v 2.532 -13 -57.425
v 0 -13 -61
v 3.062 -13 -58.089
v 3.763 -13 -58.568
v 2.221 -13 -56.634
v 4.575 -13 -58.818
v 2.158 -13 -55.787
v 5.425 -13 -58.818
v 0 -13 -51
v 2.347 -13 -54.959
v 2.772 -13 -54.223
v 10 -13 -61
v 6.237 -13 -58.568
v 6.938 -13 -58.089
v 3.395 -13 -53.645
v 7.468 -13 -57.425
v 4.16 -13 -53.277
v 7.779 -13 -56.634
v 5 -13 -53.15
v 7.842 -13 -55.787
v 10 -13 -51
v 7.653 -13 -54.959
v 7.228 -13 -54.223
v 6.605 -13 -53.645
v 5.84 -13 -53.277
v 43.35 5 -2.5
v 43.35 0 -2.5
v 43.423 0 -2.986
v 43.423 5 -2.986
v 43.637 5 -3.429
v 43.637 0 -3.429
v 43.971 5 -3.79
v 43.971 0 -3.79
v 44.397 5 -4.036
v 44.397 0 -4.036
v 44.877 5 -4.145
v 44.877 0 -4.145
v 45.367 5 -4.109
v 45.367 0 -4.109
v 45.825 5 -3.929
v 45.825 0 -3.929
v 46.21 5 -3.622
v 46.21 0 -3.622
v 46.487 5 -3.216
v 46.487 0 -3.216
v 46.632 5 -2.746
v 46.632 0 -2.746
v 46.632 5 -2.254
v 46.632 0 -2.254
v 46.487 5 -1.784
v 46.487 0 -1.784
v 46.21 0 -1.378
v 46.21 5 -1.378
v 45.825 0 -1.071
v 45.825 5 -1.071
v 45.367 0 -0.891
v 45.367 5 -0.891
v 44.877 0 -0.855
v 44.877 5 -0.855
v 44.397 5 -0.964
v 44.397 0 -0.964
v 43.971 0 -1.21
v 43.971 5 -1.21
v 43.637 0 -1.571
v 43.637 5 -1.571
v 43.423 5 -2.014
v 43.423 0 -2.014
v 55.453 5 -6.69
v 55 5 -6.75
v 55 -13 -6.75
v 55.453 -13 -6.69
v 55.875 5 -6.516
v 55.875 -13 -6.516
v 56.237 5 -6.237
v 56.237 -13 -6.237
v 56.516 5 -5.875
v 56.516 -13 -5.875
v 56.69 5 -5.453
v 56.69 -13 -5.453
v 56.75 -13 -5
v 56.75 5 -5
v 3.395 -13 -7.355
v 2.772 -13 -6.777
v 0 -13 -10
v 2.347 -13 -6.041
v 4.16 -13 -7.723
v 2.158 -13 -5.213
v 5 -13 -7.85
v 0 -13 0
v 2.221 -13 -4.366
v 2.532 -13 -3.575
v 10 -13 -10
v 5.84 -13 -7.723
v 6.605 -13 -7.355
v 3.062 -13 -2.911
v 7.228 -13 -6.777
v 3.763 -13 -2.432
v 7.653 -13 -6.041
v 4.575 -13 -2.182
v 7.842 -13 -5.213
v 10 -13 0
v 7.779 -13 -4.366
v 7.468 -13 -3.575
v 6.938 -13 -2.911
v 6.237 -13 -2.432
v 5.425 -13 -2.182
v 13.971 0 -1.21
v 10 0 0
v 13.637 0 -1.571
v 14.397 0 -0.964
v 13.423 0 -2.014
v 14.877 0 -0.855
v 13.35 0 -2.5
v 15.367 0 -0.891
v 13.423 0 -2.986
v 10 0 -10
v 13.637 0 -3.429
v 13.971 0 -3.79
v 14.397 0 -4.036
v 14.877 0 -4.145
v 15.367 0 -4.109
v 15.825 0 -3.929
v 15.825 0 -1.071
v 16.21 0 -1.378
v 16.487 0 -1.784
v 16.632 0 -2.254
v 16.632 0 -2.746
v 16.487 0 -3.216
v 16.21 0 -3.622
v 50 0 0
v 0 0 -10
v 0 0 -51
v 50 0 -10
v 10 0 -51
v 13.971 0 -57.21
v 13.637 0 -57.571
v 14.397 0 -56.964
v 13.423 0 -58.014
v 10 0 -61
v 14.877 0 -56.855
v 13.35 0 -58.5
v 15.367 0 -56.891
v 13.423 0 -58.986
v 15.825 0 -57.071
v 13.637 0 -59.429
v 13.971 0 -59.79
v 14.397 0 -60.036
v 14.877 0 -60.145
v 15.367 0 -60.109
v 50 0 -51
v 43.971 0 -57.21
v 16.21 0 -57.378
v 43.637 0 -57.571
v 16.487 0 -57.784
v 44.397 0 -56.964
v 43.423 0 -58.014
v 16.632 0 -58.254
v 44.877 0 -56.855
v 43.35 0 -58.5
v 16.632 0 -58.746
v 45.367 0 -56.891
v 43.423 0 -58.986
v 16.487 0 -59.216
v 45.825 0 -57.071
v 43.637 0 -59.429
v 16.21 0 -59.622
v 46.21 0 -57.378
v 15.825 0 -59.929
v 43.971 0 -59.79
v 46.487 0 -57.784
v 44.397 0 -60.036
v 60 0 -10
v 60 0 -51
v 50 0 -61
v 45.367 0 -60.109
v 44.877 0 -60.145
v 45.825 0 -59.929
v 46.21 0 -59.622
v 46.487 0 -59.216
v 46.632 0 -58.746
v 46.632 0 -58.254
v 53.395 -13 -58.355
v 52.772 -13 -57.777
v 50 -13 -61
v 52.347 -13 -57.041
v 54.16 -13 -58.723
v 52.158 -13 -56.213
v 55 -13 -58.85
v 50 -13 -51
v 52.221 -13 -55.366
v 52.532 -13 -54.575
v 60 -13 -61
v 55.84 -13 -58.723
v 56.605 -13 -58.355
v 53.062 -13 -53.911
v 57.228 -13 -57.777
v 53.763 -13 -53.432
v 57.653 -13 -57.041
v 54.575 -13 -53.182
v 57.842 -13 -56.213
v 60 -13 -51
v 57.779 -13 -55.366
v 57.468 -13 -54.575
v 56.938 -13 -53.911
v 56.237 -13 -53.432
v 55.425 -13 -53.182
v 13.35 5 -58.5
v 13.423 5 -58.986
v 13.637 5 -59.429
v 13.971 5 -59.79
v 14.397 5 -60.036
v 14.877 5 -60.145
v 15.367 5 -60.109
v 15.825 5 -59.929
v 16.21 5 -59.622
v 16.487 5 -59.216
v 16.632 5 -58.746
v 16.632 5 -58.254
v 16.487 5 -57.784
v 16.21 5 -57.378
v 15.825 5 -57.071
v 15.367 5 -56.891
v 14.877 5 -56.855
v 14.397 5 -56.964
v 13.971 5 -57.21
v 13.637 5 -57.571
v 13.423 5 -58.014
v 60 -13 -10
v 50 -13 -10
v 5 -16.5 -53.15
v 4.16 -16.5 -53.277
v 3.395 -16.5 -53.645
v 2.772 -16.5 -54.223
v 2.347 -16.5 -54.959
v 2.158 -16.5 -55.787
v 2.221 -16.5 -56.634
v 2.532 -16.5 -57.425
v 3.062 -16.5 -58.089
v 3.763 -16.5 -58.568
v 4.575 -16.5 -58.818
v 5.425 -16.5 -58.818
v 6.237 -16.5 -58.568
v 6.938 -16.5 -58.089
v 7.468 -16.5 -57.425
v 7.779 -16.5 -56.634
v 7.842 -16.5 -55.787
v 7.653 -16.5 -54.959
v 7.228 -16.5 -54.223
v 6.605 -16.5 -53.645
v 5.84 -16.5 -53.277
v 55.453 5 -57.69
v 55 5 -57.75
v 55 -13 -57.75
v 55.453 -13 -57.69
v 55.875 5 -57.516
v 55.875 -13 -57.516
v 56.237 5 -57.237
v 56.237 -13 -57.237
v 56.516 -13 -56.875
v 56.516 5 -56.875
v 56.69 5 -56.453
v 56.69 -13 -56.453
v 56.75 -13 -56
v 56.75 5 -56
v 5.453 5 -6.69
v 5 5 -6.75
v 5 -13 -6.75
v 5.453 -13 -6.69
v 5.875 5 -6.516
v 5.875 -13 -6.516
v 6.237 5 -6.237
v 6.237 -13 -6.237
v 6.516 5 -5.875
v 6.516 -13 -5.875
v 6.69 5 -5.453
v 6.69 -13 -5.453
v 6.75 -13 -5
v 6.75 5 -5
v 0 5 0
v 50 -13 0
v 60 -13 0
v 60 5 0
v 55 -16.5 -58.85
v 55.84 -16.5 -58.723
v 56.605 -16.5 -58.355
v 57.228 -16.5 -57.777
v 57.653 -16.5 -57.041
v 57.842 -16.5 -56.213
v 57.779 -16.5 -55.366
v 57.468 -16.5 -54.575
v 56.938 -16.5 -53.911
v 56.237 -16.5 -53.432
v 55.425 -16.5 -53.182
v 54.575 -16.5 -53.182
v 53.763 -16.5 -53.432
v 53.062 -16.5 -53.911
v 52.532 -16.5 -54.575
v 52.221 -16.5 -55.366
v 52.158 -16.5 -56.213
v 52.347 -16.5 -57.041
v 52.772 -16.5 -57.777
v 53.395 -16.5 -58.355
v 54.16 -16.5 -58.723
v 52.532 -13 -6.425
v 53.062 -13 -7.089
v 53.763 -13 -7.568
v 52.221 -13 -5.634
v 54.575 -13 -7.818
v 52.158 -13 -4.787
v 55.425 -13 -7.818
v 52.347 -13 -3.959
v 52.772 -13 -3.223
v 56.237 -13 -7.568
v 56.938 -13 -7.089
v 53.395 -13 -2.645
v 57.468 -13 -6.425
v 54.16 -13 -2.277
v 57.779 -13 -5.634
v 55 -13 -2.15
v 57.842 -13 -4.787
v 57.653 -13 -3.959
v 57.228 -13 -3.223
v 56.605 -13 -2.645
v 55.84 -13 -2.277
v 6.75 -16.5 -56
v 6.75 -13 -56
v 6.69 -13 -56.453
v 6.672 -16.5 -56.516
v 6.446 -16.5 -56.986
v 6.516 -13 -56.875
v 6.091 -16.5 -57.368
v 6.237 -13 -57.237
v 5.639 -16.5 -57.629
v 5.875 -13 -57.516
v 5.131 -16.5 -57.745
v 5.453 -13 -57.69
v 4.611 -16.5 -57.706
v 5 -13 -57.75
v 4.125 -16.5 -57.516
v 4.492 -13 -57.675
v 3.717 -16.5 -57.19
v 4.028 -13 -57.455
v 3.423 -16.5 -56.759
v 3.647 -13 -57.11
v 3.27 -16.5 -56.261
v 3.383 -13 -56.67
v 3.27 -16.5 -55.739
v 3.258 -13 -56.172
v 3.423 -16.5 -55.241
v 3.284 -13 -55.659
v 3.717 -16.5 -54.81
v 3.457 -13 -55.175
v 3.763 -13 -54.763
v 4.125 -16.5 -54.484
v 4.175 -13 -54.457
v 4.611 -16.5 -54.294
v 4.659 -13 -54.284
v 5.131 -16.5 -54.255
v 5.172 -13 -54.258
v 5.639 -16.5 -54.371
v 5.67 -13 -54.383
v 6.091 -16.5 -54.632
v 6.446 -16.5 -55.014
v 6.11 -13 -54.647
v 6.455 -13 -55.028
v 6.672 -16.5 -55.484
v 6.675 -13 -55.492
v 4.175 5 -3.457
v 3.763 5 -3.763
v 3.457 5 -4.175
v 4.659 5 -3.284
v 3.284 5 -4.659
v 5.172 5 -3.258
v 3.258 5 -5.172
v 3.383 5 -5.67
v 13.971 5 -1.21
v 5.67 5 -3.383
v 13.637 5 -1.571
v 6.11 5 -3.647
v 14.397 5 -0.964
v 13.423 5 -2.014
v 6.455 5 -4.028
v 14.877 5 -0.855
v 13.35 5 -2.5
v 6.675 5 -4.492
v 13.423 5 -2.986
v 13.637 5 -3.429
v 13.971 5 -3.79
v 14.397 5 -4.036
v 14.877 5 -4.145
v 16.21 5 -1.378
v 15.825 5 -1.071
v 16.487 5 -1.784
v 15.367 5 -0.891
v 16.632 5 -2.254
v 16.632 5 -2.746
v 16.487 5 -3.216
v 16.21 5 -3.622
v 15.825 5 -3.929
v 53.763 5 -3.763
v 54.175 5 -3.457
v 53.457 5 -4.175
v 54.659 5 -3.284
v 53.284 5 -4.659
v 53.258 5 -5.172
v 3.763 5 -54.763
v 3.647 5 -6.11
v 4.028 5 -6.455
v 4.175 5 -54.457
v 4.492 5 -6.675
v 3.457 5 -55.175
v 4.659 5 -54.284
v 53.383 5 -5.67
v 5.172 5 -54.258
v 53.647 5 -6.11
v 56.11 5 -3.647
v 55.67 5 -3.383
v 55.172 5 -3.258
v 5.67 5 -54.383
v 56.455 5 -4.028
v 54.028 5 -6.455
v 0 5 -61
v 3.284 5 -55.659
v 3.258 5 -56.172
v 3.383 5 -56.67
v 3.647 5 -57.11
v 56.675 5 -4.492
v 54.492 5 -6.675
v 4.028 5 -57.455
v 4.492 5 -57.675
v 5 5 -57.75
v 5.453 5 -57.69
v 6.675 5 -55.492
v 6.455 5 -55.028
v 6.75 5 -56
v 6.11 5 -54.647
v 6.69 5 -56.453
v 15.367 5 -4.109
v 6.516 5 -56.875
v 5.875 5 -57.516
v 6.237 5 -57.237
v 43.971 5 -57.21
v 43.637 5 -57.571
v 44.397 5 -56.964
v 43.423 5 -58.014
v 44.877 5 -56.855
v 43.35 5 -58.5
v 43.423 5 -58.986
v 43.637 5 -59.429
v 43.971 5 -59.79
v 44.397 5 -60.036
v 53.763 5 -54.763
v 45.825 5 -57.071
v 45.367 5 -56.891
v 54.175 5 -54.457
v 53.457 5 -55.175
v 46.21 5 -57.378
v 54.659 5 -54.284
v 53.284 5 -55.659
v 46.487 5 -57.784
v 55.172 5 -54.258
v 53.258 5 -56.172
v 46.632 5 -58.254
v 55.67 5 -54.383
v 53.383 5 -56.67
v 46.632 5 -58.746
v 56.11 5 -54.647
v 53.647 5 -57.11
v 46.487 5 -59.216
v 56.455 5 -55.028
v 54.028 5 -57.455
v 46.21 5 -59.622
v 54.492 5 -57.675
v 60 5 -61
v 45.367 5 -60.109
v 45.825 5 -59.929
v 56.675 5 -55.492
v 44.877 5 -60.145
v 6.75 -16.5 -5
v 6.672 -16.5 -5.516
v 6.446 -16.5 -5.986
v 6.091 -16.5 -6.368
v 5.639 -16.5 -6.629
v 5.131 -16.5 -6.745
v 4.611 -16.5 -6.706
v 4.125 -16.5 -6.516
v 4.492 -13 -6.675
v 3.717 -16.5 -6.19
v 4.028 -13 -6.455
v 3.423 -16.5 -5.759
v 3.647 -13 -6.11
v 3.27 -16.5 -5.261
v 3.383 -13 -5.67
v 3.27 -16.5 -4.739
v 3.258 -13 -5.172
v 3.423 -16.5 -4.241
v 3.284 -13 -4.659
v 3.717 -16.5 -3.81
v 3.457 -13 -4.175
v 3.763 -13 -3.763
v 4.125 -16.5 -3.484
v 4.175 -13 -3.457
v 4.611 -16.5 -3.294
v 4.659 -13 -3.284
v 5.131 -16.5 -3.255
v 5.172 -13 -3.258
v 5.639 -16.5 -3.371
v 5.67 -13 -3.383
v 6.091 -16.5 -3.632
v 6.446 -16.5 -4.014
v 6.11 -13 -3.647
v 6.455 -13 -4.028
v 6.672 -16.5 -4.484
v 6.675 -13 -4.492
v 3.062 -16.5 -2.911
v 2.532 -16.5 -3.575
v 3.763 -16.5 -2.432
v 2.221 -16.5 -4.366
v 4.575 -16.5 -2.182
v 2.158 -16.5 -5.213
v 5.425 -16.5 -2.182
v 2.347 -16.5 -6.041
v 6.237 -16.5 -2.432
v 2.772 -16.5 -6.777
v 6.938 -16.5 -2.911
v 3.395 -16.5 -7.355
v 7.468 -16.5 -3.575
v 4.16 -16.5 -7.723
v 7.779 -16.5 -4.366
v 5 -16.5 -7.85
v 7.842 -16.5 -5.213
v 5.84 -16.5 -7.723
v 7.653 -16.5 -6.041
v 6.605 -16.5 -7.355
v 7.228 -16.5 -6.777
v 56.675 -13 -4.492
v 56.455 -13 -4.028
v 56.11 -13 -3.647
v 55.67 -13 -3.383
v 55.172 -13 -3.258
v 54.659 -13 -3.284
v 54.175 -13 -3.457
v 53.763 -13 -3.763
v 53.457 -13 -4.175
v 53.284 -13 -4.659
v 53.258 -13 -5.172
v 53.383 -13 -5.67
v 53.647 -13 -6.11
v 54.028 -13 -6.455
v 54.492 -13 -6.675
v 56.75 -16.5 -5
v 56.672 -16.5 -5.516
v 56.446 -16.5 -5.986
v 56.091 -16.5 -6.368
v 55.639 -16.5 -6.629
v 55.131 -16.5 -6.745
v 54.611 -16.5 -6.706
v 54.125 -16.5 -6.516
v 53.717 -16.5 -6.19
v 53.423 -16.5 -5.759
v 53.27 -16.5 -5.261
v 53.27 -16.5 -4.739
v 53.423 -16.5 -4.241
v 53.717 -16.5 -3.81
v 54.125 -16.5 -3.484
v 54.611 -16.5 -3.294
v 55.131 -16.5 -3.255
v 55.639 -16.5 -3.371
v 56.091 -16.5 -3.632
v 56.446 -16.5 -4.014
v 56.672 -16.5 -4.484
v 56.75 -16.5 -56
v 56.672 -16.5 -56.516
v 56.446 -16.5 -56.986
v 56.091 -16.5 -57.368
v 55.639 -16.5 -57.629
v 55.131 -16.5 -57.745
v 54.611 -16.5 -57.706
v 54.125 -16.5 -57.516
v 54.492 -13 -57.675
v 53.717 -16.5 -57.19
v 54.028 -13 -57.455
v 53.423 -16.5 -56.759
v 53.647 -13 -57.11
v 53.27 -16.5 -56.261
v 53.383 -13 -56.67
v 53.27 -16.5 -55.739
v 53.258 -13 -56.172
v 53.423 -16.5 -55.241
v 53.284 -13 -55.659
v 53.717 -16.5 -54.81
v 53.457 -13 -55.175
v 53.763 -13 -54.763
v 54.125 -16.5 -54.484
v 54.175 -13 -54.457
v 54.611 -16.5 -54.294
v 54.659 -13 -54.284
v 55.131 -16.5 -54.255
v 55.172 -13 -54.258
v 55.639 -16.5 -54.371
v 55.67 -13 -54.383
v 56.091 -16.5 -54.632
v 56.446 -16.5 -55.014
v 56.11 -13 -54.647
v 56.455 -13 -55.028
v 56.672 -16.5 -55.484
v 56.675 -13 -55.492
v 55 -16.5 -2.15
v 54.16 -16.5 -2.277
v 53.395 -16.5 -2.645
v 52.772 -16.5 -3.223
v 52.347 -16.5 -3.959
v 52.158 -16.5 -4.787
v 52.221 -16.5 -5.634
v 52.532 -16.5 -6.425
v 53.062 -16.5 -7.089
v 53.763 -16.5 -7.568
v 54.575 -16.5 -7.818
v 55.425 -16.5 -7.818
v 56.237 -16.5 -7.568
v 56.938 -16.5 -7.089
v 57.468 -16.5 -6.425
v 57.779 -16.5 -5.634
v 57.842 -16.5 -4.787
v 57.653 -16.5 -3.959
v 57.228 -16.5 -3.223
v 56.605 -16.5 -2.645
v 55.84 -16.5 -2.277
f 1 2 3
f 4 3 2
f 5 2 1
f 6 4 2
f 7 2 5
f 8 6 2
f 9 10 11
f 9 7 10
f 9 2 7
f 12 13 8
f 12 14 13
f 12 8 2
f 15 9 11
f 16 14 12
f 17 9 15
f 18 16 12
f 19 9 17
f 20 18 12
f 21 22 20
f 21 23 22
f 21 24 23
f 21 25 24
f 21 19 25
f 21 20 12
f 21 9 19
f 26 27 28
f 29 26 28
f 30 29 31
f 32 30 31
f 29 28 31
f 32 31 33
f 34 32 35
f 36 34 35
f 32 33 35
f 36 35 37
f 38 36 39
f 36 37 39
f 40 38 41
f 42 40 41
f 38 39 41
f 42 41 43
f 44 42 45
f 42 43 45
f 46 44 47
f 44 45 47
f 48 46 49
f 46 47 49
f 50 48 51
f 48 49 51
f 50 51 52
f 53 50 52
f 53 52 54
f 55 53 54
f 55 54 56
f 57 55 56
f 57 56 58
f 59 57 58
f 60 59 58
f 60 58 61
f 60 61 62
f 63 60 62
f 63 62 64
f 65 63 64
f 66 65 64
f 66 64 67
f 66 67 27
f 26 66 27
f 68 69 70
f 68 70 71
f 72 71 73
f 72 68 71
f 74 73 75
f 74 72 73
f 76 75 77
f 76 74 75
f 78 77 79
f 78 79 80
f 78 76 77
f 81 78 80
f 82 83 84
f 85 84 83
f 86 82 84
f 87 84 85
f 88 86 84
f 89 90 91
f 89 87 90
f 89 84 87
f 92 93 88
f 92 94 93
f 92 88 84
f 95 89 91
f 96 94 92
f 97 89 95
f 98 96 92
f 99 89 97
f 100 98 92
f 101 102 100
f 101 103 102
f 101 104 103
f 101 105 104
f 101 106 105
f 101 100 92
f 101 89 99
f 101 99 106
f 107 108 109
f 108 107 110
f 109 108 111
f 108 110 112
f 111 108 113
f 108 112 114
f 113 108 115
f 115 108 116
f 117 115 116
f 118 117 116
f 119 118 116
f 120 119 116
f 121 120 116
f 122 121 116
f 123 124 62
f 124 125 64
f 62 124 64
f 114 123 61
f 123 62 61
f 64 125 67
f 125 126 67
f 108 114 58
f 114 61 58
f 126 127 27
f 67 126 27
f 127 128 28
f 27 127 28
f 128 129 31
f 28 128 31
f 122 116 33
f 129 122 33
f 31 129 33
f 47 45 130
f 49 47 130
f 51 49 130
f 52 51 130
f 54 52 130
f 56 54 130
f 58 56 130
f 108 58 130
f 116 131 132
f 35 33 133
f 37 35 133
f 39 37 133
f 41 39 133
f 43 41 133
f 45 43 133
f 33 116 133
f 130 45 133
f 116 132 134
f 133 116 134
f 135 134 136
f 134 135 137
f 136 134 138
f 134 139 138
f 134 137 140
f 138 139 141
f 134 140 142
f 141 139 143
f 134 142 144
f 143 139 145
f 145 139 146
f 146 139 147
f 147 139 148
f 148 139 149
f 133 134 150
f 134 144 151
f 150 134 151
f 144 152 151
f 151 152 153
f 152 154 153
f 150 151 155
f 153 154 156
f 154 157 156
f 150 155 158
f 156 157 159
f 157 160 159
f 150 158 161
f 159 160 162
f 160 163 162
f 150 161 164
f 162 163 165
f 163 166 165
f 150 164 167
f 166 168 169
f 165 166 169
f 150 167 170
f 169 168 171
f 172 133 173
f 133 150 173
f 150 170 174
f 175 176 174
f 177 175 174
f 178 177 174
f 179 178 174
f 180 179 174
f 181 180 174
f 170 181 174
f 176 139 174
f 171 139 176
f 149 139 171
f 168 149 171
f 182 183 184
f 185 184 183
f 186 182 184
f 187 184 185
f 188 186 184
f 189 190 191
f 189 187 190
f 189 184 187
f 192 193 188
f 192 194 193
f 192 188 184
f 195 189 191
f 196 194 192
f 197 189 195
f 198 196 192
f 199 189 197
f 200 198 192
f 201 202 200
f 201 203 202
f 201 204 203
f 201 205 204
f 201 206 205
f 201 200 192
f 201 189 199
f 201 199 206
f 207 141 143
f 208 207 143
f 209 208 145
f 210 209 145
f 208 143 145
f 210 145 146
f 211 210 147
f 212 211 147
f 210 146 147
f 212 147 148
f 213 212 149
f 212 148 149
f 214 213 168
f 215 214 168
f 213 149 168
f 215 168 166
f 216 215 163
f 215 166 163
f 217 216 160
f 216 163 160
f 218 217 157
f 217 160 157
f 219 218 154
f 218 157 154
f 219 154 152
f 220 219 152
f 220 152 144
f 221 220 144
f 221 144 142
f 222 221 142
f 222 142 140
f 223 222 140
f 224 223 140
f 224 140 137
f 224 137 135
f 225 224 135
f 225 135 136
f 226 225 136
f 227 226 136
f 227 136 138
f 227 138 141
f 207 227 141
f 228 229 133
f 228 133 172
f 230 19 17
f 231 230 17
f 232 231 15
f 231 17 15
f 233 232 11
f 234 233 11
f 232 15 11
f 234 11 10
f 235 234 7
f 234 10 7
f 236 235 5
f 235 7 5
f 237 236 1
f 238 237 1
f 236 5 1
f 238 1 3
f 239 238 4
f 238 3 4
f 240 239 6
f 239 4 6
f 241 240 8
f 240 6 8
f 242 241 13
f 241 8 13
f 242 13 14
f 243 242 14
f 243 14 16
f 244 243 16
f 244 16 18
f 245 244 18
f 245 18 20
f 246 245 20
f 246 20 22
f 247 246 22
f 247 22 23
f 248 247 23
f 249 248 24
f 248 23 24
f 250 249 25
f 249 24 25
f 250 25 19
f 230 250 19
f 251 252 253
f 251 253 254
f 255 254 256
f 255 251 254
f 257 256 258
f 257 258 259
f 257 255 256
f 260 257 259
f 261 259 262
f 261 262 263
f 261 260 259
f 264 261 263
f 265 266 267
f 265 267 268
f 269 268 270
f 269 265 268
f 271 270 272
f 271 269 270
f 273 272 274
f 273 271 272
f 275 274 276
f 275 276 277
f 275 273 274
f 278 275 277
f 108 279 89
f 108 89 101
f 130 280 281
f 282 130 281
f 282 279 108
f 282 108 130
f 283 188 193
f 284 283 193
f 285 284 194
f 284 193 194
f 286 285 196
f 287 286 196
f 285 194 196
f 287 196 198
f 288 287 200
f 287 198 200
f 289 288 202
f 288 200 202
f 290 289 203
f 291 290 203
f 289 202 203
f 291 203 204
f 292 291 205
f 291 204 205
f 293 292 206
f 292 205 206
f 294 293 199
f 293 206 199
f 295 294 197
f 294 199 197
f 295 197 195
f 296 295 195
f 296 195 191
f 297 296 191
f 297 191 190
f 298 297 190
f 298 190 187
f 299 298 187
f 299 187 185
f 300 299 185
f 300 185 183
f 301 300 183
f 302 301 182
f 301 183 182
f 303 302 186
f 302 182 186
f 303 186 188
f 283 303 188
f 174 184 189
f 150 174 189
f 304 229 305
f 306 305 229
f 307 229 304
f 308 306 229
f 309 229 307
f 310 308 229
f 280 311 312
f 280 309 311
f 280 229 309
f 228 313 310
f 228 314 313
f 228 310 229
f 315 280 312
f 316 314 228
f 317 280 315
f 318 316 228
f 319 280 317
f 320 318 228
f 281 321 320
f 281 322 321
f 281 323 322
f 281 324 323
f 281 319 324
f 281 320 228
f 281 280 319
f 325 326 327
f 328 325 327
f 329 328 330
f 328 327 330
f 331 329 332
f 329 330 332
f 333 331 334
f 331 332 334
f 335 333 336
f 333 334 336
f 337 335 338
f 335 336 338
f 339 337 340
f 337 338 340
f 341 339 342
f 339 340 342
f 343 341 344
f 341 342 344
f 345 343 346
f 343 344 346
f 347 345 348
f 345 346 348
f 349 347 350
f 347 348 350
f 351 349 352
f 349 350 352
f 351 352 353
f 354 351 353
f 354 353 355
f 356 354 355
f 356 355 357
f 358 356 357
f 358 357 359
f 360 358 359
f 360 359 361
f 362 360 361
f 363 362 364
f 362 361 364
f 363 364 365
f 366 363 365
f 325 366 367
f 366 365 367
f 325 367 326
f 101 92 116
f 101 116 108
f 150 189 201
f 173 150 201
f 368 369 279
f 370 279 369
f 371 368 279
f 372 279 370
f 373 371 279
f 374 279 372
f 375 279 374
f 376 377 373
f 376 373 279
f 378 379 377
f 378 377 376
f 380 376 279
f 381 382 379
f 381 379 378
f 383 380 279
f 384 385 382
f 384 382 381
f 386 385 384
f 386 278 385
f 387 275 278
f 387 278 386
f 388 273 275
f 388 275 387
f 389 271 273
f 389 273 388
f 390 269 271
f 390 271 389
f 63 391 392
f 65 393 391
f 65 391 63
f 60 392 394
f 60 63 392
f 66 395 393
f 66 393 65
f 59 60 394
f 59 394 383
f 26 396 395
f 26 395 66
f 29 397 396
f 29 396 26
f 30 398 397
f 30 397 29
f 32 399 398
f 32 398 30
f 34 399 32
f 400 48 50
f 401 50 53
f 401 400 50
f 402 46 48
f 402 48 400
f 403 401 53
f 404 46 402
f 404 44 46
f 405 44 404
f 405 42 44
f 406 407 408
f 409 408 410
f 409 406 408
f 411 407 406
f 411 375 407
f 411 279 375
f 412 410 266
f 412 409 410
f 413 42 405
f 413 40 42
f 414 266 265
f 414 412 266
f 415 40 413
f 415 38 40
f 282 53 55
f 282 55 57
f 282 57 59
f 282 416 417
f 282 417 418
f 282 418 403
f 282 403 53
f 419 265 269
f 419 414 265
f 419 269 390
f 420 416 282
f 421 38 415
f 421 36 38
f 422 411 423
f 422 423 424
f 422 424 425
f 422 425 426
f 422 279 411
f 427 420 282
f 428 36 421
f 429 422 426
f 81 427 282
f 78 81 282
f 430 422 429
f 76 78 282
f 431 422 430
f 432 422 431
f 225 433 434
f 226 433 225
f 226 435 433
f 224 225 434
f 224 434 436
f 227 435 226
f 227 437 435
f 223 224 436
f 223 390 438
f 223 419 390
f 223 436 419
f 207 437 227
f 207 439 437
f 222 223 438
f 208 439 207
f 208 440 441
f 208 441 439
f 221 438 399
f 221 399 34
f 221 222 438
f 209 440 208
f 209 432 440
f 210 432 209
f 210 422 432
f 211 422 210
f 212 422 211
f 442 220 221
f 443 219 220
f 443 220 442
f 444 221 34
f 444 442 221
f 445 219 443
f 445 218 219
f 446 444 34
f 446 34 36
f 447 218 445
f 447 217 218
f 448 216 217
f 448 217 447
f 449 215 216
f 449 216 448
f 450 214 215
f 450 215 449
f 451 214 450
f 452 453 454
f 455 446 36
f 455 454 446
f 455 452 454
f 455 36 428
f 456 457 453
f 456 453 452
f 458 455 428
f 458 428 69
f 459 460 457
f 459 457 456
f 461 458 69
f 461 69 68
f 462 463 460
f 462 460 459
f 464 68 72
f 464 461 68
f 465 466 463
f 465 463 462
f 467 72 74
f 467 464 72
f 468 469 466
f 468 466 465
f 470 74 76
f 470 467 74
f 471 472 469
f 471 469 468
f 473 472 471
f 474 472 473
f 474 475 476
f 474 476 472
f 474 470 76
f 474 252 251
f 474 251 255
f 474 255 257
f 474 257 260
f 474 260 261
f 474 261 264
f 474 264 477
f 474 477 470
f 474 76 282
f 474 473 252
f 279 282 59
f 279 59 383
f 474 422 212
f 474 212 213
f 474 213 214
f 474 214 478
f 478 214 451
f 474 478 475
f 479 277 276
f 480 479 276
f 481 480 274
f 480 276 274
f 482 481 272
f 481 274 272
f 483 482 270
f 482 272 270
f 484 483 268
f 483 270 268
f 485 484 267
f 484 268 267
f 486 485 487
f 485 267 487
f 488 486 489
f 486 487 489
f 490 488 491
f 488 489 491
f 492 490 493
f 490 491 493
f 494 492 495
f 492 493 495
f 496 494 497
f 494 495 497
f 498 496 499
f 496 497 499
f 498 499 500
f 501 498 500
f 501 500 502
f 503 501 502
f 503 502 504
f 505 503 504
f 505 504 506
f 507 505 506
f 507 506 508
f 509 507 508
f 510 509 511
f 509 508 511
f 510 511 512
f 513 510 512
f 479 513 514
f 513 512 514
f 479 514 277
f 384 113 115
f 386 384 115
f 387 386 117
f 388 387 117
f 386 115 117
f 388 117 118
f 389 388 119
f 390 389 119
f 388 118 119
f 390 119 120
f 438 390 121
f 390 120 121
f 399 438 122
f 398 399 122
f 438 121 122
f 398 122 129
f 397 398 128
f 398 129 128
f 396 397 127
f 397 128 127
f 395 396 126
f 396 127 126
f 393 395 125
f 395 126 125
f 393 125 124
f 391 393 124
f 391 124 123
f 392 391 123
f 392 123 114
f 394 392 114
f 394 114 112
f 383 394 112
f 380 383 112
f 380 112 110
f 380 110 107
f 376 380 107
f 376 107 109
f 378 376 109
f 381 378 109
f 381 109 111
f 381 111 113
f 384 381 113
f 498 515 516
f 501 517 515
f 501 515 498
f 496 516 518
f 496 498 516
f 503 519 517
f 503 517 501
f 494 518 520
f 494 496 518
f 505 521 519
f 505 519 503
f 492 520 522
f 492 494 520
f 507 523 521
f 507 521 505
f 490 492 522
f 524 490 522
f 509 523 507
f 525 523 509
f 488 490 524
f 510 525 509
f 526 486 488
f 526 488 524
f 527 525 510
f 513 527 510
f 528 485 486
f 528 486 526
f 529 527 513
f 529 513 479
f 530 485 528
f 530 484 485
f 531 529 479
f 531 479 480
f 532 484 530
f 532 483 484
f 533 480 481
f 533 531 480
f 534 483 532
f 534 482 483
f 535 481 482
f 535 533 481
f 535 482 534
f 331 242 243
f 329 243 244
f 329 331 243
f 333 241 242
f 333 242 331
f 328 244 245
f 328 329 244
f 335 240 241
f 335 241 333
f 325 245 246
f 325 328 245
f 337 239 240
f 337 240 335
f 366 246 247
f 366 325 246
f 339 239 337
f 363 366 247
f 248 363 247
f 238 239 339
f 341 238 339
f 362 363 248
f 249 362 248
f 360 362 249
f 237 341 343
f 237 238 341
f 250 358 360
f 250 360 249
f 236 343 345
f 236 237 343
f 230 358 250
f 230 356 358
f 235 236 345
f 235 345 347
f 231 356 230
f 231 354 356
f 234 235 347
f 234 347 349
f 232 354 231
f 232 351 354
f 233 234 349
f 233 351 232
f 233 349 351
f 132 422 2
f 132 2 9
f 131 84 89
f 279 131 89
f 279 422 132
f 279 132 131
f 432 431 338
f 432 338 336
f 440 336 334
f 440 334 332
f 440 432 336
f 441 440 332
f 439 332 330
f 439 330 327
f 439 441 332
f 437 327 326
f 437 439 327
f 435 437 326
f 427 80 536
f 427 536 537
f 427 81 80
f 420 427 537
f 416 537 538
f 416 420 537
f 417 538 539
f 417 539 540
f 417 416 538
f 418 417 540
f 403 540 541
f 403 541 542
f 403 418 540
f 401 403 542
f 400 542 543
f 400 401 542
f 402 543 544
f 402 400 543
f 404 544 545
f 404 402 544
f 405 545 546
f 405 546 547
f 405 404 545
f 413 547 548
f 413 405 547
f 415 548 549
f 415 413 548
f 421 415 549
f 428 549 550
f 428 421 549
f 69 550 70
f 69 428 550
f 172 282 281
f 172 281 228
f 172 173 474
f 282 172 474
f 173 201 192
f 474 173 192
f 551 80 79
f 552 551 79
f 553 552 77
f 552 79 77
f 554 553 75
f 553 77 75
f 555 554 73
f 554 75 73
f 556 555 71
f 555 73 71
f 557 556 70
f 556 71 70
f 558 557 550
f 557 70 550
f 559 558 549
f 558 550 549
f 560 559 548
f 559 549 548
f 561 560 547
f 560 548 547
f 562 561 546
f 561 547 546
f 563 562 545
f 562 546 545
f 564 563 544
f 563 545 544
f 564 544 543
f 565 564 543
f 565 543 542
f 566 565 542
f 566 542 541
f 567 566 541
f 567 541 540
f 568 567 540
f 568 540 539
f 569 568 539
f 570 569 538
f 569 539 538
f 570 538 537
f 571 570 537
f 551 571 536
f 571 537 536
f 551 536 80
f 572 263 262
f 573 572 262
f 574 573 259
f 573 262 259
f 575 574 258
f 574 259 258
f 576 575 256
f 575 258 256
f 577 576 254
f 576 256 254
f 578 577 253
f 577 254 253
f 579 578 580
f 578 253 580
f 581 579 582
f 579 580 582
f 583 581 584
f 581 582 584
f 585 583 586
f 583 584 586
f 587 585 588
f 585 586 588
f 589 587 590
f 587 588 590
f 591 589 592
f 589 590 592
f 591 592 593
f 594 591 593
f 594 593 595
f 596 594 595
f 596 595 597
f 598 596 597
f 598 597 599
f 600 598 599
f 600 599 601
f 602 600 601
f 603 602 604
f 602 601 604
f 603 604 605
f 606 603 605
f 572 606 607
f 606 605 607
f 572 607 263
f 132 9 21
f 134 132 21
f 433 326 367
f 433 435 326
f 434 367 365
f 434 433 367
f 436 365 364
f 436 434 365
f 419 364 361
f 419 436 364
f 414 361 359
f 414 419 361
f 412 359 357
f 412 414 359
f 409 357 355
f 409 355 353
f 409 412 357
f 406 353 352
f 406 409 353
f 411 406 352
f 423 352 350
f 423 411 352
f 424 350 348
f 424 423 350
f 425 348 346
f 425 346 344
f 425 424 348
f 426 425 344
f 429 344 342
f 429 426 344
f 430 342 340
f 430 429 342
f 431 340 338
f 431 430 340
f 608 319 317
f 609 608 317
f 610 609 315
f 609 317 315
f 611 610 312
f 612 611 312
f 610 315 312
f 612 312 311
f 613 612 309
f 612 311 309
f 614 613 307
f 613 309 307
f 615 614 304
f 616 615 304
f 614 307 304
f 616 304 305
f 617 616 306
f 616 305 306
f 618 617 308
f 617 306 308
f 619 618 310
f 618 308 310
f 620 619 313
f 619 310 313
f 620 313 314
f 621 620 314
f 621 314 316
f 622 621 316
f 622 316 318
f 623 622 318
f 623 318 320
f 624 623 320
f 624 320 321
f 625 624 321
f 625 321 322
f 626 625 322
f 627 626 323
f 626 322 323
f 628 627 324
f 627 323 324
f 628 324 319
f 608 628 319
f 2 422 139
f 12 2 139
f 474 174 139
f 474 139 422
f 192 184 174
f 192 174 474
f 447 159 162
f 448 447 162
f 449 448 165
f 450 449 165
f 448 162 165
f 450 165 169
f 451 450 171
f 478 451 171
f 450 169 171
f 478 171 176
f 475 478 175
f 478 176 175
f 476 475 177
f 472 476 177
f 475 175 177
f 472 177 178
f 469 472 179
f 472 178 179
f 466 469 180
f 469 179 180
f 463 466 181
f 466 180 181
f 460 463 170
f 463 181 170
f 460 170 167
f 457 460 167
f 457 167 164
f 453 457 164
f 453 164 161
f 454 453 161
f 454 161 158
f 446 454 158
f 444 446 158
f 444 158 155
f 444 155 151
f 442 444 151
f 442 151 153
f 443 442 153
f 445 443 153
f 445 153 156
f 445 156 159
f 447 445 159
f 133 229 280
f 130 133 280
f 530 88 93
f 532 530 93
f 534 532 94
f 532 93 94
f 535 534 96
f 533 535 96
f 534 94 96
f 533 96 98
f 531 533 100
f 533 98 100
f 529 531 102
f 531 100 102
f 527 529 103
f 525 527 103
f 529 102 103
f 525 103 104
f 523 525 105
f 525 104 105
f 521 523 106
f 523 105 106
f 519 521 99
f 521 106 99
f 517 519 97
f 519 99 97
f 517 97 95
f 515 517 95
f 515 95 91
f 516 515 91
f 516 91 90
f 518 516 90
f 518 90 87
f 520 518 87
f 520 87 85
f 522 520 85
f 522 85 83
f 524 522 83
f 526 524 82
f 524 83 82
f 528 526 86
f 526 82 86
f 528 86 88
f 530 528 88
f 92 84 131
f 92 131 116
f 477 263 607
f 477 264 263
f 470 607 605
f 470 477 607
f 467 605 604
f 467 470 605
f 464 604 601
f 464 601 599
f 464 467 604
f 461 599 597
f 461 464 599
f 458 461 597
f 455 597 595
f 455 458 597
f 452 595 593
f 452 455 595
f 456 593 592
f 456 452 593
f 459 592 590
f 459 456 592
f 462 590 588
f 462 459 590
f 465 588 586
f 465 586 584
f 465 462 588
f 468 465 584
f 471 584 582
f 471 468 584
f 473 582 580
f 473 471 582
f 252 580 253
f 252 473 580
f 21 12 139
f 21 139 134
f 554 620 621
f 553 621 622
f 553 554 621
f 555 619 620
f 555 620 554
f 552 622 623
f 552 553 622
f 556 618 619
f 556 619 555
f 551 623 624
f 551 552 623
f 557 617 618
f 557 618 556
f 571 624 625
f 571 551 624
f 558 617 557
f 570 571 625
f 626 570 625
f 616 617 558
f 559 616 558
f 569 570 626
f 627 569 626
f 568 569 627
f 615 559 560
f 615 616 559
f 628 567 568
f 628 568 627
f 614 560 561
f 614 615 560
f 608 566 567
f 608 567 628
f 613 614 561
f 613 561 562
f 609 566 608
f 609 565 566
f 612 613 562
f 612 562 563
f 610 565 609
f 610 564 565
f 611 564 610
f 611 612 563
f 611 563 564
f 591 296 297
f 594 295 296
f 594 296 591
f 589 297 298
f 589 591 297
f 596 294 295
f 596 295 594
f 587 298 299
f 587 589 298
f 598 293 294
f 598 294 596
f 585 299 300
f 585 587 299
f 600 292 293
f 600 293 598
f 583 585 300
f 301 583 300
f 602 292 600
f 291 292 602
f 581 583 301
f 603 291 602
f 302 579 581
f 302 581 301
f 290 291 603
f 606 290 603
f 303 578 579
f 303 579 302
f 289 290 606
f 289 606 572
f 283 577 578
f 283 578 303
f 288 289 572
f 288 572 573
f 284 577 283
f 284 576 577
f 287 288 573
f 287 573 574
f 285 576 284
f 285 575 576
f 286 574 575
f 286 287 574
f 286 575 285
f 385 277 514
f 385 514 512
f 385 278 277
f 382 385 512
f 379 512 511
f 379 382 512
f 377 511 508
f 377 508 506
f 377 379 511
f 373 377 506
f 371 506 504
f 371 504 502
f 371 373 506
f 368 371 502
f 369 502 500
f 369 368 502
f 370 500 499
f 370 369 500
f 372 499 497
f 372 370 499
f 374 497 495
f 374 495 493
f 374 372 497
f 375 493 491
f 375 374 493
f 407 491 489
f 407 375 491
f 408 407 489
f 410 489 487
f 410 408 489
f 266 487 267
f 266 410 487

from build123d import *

# Parameters (mm, degrees)
SKETCH_1_W               = 60
SKETCH_1_H               = 61
EXTRUDE_1_DEPTH          = 5
SKETCH_2_W               = 10
SKETCH_2_H               = 10
EXTRUDE_2_DEPTH          = 13
HOLE_WIZARD_2_D          = 3.3
SKETCH_9_R               = 2.85
EXTRUDE_3_DEPTH          = 3.5
SKETCH_5_W               = 1.75
SKETCH_5_H               = 18
HOLE_WIZARD_1_AT_2_COUNT = 2
HOLE_WIZARD_1_AT_2_PITCH = 51
HOLE_WIZARD_1_AT_3_COUNT = 2
HOLE_WIZARD_1_AT_3_PITCH = 71.421285343
HOLE_WIZARD_1_AT_4_COUNT = 2
HOLE_WIZARD_1_AT_4_PITCH = 50
HOLE_WIZARD_3_D          = 3.5


with BuildPart() as part:
    # 草图1 → 凸台-拉伸1 (new body)
    with BuildSketch(Plane(origin=(0, 0, 0), x_dir=(1, 0, 0), z_dir=(0, 1, 0))):
        with Locations((30, 30.5)):
            Rectangle(SKETCH_1_W, SKETCH_1_H)
    extrude(amount=EXTRUDE_1_DEPTH)

    # 草图2 → 凸台-拉伸2 (add)
    with BuildSketch(Plane.XZ):
        with Locations((5, -5)):
            Rectangle(SKETCH_2_W, SKETCH_2_H)
        with Locations((55, -5)):
            Rectangle(SKETCH_2_W, SKETCH_2_H)
        with Locations((55, -56)):
            Rectangle(SKETCH_2_W, SKETCH_2_H)
        with Locations((5, -56)):
            Rectangle(SKETCH_2_W, SKETCH_2_H)
    extrude(amount=EXTRUDE_2_DEPTH)

    # 孔2 (through all)
    with Locations(Plane(origin=(0, 5, 0), x_dir=(1, 0, 0), z_dir=(0, 1, 0))):
        with Locations((15, 58.5), (45, 58.5), (45, 2.5), (15, 2.5)):
            Hole(HOLE_WIZARD_2_D / 2)

    # 草图9 → 凸台-拉伸3 (add)
    with BuildSketch(Plane.XZ.offset(13)):
        with Locations(Location((5, -56, 0), (0, 0, 90))):
            Circle(SKETCH_9_R)
        with Locations(Location((55, -56, 0), (0, 0, 270))):
            Circle(SKETCH_9_R)
        with Locations(Location((55, -5, 0), (0, 0, 90))):
            Circle(SKETCH_9_R)
        with Locations(Location((5, -5, 0), (0, 0, 270))):
            Circle(SKETCH_9_R)
    extrude(amount=EXTRUDE_3_DEPTH)

    # 草图5 → 孔1 (revolve, cut)
    with BuildSketch(Plane(origin=(5, -13, -5), x_dir=(0, 0, -1), z_dir=(1, 0, 0))):
        with Locations((0.875, 9)):
            Rectangle(SKETCH_5_W, SKETCH_5_H)
    hole_wizard_1 = revolve(axis=Axis((5, 97, -5), (0, -1, 0)), mode=Mode.SUBTRACT)

    # 孔1 at 2: 孔1 ×2
    with Locations(*[(0, 0, -i * HOLE_WIZARD_1_AT_2_PITCH) for i in range(1, HOLE_WIZARD_1_AT_2_COUNT)]):
        add(hole_wizard_1, mode=Mode.SUBTRACT)

    # 孔1 at 3: 孔1 ×2
    with Locations(*[Vector(0.7000714109260575, 0, -0.7140728391445785) * (i * HOLE_WIZARD_1_AT_3_PITCH) for i in range(1, HOLE_WIZARD_1_AT_3_COUNT)]):
        add(hole_wizard_1, mode=Mode.SUBTRACT)

    # 孔1 at 4: 孔1 ×2
    with Locations(*[(i * HOLE_WIZARD_1_AT_4_PITCH, 0, 0) for i in range(1, HOLE_WIZARD_1_AT_4_COUNT)]):
        add(hole_wizard_1, mode=Mode.SUBTRACT)

    # 孔3 (through all)
    with Locations(Plane(origin=(0, -16.5, 0), x_dir=(-1, 0, 0), z_dir=(0, -1, 0))):
        with Locations((-5, 5), (-5, 56), (-55, 56), (-55, 5)):
            Hole(HOLE_WIZARD_3_D / 2)


solid = part.part
